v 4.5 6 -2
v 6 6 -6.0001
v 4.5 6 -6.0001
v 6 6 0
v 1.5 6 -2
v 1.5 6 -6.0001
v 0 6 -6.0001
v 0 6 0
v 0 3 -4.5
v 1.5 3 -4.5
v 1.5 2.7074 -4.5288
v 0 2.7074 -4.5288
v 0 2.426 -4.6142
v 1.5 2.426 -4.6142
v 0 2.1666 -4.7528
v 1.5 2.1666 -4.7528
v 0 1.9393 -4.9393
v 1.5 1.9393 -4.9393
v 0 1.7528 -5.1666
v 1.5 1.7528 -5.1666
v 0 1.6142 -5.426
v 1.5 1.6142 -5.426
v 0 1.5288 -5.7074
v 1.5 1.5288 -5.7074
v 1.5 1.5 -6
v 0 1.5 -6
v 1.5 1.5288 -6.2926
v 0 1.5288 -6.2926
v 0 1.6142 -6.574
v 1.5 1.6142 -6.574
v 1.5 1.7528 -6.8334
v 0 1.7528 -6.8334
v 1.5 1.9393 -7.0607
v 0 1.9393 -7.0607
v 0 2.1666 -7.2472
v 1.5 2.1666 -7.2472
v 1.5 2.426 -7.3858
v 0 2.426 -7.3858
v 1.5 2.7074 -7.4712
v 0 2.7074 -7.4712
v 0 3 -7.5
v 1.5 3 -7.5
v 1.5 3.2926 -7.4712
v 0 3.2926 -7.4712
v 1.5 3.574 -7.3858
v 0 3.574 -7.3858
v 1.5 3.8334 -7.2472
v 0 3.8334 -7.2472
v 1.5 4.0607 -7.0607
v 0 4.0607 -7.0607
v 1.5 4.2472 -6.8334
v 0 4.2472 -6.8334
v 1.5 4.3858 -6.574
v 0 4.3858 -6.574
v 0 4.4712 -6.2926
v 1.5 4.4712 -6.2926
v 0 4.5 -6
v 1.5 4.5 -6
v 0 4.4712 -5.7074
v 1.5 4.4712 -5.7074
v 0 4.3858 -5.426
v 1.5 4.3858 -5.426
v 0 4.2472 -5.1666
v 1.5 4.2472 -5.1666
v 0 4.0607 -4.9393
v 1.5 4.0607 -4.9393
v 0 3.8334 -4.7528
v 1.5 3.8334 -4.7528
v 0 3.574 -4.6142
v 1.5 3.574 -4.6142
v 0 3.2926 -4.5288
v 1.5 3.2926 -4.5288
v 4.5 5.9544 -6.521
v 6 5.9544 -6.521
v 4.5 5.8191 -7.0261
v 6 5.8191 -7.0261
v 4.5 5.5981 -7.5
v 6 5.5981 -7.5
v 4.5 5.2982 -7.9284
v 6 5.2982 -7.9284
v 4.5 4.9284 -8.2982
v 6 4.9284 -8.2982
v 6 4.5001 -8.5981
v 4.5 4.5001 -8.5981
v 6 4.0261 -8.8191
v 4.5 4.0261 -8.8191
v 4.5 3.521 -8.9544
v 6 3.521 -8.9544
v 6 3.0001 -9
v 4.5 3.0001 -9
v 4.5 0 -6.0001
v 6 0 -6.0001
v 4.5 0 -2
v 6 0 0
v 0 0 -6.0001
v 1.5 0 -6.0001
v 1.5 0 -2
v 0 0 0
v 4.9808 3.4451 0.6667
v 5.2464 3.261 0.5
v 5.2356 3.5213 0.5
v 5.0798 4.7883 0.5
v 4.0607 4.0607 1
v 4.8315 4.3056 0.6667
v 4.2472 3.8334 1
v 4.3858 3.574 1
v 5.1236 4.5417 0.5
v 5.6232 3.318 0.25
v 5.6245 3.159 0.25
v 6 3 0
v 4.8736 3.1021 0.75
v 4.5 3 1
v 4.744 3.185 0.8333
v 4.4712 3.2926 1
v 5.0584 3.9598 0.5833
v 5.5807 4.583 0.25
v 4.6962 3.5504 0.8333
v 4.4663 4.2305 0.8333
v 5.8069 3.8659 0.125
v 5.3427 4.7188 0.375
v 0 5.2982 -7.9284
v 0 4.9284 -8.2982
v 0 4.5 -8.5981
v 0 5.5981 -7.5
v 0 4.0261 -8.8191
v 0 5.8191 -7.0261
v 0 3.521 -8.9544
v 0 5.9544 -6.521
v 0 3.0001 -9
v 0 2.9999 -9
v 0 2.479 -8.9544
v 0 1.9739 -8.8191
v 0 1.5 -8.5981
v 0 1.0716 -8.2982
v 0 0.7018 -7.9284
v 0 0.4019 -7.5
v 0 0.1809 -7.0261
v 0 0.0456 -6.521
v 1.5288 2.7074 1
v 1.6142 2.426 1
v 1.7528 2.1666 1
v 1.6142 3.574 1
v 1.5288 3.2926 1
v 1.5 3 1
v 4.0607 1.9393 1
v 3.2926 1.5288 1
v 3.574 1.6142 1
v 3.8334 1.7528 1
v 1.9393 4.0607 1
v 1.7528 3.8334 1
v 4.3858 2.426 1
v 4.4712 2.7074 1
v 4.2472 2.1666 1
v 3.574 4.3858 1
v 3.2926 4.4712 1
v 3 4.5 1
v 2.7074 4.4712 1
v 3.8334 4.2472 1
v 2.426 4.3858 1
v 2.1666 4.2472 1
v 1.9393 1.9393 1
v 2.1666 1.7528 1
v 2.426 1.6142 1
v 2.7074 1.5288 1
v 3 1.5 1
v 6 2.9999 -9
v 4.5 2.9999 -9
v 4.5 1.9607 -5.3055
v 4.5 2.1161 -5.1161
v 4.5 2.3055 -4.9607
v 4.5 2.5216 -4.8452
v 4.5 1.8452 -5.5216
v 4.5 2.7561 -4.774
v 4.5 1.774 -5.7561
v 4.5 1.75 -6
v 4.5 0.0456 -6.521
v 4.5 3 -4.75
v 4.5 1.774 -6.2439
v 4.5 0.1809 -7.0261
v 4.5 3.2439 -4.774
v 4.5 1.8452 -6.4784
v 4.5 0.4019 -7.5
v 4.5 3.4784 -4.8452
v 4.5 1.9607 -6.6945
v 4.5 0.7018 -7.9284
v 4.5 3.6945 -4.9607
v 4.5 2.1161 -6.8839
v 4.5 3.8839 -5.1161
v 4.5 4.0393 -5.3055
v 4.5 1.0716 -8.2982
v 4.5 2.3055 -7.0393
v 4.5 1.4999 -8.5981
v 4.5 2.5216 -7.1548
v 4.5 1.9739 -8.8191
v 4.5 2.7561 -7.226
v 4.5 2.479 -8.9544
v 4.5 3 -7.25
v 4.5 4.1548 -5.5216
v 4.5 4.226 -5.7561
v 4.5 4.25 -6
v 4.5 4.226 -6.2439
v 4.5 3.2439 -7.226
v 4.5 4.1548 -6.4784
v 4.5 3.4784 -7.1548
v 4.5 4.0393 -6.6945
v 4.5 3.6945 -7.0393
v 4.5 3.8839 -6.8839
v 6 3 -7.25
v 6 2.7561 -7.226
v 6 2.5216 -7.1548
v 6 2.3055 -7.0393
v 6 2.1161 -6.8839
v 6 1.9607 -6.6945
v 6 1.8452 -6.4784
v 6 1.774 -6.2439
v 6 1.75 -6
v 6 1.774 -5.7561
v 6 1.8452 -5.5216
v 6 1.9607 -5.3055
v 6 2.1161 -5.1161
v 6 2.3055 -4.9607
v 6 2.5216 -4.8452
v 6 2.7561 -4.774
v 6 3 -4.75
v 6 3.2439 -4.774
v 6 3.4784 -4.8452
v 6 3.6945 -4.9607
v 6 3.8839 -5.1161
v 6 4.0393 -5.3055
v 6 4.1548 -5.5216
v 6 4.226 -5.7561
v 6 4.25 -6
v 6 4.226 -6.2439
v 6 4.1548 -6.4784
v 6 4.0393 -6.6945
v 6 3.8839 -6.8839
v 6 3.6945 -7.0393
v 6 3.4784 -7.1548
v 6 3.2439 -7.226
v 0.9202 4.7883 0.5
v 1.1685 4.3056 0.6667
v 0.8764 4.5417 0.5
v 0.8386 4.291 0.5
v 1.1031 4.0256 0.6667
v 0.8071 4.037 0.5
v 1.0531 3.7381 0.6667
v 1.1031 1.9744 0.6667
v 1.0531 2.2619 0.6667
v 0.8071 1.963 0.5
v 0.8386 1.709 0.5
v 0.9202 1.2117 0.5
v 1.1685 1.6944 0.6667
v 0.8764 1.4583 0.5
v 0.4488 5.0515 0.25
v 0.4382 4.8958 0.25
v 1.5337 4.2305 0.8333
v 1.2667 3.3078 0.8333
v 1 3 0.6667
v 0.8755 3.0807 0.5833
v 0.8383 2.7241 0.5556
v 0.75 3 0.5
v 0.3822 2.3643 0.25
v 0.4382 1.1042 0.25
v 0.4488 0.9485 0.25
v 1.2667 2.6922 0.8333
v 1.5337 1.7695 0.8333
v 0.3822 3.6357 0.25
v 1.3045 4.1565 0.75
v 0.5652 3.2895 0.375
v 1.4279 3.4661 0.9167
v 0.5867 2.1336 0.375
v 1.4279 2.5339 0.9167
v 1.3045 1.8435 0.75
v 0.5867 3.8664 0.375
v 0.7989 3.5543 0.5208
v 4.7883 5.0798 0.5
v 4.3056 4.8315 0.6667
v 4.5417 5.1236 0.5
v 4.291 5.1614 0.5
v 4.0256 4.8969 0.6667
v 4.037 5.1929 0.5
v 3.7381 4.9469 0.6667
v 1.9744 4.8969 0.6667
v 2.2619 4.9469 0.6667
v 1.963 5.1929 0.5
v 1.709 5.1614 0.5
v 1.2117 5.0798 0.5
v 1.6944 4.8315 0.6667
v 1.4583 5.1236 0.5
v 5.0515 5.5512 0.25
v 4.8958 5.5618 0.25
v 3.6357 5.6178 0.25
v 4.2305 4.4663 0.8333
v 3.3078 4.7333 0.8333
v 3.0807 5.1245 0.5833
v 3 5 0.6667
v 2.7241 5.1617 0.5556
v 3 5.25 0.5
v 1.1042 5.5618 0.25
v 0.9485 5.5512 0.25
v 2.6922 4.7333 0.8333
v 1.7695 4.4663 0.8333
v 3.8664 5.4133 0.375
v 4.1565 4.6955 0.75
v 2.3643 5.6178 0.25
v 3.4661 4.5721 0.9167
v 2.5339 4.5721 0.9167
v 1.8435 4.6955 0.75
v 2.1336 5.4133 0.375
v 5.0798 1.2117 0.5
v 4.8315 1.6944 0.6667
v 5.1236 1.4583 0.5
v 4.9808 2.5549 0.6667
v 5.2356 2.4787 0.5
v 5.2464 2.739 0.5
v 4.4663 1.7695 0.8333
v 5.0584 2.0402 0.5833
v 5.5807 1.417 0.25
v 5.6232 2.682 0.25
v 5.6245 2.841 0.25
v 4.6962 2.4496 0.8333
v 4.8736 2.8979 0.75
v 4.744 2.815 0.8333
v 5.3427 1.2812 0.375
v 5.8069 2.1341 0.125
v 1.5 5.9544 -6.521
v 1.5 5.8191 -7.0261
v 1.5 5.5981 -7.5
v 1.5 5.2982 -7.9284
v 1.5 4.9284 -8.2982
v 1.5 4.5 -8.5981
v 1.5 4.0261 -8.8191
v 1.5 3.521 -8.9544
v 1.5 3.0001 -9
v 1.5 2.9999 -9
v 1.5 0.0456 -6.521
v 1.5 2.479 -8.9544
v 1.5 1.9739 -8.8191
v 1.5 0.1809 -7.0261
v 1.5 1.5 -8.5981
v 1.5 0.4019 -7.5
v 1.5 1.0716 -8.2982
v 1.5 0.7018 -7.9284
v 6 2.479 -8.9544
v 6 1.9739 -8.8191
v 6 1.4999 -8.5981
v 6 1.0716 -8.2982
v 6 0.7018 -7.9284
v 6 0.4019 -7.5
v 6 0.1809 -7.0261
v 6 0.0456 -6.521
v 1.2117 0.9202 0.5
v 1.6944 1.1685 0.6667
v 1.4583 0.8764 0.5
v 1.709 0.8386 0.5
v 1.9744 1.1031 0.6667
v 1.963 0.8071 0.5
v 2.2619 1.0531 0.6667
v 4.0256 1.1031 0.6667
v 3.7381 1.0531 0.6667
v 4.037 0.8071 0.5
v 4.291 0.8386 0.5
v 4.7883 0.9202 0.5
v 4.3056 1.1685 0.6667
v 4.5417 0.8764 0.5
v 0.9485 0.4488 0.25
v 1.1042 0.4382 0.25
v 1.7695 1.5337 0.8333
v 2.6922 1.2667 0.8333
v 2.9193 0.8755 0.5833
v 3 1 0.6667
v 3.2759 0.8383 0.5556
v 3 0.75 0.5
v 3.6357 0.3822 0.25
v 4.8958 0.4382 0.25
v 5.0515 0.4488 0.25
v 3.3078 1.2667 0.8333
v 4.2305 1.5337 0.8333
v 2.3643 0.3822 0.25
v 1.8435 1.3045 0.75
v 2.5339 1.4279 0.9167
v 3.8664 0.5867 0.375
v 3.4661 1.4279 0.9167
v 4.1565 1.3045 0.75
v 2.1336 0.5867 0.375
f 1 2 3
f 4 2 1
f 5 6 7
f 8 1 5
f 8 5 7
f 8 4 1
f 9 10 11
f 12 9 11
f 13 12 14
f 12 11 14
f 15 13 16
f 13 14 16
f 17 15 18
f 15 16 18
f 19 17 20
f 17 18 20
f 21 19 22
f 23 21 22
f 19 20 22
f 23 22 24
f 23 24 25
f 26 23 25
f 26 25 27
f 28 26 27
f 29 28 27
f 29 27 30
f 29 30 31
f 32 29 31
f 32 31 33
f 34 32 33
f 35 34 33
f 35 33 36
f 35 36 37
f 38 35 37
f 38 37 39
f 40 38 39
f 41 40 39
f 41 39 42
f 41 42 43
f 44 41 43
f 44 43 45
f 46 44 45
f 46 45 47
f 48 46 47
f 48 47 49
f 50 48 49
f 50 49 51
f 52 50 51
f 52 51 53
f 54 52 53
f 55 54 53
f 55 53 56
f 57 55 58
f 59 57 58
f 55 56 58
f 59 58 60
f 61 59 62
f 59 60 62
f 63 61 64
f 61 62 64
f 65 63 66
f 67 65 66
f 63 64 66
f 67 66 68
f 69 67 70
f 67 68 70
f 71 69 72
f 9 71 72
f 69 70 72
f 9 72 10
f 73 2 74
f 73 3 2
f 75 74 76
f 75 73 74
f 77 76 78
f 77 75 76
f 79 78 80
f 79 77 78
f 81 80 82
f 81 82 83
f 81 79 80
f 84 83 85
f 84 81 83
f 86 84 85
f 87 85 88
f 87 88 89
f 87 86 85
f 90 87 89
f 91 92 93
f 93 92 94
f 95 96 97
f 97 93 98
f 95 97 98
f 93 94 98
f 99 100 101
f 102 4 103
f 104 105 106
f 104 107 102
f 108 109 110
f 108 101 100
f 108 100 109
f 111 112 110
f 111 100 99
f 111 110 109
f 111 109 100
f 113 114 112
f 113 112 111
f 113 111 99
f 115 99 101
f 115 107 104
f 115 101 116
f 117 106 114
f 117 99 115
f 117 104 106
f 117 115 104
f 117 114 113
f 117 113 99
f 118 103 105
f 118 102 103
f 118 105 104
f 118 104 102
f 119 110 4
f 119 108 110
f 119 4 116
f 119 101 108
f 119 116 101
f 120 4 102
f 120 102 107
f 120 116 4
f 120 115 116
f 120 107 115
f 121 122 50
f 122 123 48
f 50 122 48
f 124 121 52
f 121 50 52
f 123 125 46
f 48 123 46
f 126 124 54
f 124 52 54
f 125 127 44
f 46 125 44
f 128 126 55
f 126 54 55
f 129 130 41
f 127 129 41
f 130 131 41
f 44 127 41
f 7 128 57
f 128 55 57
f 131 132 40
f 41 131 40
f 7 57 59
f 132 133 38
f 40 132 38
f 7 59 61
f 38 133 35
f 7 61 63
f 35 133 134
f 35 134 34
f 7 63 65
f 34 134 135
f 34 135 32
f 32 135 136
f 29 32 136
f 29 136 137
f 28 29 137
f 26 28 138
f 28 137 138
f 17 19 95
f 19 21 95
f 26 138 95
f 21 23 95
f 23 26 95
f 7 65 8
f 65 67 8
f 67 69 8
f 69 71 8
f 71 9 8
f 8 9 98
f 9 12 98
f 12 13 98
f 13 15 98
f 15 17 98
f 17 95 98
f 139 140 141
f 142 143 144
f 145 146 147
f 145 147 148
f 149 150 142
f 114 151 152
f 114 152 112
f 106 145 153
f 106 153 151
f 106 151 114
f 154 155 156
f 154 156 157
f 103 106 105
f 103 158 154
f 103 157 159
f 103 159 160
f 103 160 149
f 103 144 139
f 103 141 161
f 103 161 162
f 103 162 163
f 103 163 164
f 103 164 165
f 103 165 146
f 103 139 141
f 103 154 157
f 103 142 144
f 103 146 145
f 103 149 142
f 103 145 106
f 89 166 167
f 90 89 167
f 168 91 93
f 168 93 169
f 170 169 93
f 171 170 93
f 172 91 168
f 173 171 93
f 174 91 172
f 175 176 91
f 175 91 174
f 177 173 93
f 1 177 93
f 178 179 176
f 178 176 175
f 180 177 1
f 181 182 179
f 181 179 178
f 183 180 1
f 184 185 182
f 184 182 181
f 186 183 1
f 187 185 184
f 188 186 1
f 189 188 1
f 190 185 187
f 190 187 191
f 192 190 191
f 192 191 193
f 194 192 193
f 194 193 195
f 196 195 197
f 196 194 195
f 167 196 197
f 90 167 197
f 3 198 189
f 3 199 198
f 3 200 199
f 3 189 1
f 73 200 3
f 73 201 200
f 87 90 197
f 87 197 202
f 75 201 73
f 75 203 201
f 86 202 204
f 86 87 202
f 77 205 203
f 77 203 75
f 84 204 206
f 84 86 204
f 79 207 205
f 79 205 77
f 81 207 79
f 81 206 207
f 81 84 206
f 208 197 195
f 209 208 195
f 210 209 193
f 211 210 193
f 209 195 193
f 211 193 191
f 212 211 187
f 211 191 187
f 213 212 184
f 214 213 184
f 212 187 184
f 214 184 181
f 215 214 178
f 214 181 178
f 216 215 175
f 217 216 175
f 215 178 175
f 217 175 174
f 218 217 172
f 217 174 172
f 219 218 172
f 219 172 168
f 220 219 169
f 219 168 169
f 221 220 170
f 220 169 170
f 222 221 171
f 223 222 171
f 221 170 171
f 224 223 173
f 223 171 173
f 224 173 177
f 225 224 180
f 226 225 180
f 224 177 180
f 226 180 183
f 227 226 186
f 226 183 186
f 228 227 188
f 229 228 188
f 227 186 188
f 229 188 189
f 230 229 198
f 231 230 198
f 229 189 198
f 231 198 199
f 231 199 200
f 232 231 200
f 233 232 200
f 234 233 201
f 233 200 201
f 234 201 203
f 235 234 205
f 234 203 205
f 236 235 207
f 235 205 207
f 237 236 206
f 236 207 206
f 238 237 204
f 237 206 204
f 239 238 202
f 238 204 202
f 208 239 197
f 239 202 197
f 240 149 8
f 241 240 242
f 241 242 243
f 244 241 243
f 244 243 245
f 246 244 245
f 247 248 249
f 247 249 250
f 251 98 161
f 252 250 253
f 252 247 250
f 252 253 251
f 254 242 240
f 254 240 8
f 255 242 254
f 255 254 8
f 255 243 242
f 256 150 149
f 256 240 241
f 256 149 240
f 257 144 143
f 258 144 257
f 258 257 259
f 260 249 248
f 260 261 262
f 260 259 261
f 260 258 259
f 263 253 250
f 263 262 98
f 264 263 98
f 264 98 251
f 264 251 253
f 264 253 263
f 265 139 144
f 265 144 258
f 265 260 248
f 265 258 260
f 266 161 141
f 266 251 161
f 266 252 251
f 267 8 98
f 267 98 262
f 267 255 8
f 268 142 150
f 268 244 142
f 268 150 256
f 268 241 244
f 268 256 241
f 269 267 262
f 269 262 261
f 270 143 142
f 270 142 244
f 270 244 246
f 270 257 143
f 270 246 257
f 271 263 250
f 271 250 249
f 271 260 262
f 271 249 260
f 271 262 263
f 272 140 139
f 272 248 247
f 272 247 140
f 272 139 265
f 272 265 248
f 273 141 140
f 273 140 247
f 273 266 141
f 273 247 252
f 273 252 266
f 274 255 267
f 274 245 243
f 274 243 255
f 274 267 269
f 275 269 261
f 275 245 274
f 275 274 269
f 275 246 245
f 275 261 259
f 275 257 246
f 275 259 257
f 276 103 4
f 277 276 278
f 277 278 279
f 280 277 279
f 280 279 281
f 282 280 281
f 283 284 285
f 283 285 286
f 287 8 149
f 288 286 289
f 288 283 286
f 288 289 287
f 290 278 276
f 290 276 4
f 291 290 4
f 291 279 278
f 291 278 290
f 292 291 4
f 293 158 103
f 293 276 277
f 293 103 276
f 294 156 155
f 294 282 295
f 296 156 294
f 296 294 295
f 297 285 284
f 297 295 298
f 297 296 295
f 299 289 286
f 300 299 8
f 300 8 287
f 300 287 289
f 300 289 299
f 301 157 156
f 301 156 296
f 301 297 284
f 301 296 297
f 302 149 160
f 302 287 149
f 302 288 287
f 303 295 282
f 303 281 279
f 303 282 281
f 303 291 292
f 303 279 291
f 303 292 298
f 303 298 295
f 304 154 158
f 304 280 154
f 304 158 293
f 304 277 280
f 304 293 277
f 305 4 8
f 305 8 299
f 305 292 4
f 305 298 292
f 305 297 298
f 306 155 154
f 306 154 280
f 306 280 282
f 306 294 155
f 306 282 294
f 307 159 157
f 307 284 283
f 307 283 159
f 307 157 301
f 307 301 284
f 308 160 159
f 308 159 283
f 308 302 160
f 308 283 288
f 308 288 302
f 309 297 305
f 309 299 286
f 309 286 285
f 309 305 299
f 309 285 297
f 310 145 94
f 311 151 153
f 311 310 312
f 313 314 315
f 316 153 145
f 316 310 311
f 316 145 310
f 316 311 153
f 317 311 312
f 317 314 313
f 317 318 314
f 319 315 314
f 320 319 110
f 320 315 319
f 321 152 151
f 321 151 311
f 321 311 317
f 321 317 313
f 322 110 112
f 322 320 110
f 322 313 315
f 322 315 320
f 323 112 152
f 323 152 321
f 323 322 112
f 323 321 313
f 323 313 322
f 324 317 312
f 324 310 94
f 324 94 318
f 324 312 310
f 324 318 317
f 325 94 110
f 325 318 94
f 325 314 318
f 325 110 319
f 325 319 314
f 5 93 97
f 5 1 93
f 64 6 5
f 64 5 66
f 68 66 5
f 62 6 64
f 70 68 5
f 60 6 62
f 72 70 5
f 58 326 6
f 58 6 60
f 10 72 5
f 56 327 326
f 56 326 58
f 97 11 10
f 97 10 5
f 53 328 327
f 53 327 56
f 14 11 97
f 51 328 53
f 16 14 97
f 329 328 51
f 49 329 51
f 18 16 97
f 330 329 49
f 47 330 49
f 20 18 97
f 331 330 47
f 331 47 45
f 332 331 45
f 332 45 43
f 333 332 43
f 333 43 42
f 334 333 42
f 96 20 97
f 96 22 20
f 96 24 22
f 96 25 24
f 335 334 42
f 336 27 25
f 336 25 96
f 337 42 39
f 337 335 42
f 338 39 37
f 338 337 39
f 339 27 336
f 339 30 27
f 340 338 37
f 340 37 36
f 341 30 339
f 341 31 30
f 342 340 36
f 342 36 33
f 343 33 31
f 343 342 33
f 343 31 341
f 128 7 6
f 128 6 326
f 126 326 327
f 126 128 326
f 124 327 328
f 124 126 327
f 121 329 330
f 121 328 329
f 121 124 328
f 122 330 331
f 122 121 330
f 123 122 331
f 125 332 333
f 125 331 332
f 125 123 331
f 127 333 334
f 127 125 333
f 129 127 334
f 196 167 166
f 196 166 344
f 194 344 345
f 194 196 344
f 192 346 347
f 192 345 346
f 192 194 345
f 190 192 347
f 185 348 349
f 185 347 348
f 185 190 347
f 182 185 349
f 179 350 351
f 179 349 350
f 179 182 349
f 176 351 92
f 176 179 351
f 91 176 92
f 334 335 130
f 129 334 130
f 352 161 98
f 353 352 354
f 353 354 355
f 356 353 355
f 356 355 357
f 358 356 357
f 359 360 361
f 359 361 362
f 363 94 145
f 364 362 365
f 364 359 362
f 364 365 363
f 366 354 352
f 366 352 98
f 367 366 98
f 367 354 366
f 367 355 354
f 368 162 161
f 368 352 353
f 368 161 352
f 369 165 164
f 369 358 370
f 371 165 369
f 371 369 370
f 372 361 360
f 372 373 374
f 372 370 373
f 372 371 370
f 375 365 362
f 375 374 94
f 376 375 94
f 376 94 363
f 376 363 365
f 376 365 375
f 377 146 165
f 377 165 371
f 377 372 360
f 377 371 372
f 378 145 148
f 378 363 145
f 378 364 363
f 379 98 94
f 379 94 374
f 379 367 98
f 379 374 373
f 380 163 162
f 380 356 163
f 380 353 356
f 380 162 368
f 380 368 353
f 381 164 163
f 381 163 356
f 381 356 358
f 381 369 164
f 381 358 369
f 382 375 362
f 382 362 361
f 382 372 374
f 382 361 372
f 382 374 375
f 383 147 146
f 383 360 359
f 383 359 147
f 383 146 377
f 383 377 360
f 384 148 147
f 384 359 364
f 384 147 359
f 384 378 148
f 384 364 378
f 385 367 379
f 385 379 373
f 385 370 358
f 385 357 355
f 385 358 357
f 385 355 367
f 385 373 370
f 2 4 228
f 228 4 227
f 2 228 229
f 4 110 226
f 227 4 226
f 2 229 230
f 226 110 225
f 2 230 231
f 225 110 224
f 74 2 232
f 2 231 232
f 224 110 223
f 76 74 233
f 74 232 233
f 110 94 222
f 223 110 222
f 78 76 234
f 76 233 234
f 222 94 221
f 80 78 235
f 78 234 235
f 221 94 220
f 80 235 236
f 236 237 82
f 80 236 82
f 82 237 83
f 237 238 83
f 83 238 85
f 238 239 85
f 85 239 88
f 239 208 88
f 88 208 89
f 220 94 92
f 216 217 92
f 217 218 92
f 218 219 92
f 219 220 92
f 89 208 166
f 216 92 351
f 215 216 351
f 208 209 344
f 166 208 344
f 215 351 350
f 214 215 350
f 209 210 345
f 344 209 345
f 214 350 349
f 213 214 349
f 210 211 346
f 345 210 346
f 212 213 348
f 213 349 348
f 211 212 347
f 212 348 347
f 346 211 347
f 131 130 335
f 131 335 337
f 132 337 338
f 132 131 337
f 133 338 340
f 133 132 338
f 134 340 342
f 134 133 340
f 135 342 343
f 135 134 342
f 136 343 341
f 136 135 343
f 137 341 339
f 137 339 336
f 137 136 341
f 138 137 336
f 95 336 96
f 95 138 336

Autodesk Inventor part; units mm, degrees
ref_plane "YZ Plane" through (0, 0, 0) normal (1, 0, 0) x (0, 1, 0)
ref_plane "XZ Plane" through (0, 0, 0) normal (0, 1, 0) x (-1, 0, 0)
sketch "Sketch1" plane through (0, 0, 0) normal (0, 1, 0) x (-1, 0, 0)
  line L0 (0, 0) -> (-6, 0)
  line L1 (-6, 0) -> (-6, -9)
  line L2 (-6, -9) -> (0, -9)
  line L3 (0, -9) -> (0, 0)
  dimension "d0" = 6
  dimension "d1" = 9
extrude "Extrusion1" add sketch "Sketch1" along normal blind 6
sketch "Sketch2" plane through (6, 0, -9) normal (0, 0, -1) x (-1, 0, 0)
  line L0 (0, 6) -> (6, 6) projected
  line L1 (0, 0) -> (6, 0) projected
  line L2 (1.5, 6) -> (4.5, 6)
  line L3 (4.5, 6) -> (4.5, 0)
  line L4 (4.5, 0) -> (1.5, 0)
  line L5 (1.5, 0) -> (1.5, 6)
  line L6 (0, 0) -> (0, 6) projected
  dimension "d4" = 3
  dimension "d5" = 1.5
sketch "Sketch3" plane through (0, 0, 0) normal (0, -1, 0) x (1, 0, 0)
  line L0 (6, 0) -> (6, -9) projected
  line L1 (0, 0) -> (6, 0) projected
  point P0 (3, 1)
  dimension "d6" = 3
  dimension "d7" = 1
ref_plane "Work Plane1" through (3, 0, 1) normal (0, 0, 1) x (1, 0, 0)
sketch "Sketch4" plane through (3, 0, 1) normal (0, 0, 1) x (1, 0, 0)
  point P0 (-3, 0)
sketch "Sketch5" plane through (3, 0, 1) normal (0, 0, 1) x (1, 0, 0)
  circle A0 centre (0, 3) radius 1.5
  point P0 (-3, 0)
  dimension "d8" = 3
loft "Loft1" add profiles "Sketch5" section 1 edges at (3, 0, 0) (6, 3, 0) (3, 6, 0) (0, 3, 0)
extrude "Extrusion2" cut sketch "Sketch2" against normal blind 7 contours L0 L3 L1 L5
sketch "Sketch6" plane through (6, 0, -9) normal (1, 0, 0) x (0, 0, -1)
  line L0 (-9, 0) -> (-9, 6) projected
  line L1 (-9, 6) -> (0, 6) projected
  point P0 (-3, 3)
  dimension "d15" = 6
  dimension "d16" = 3
hole "Hole1" at (6, 3, -6) direction (-1, 0, 0) diameter 2.5 depth 1.5 tip angle 118
sketch "Sketch7" plane through (0, 0, -9) normal (-1, 0, 0) x (0, 0, 1)
  circle A0 centre (3, 3) radius 1.25 projected
  point P0 (9, 0)
hole "Hole2" at (0, 3, -6) at (0, 3, -6) direction (1, 0, 0) diameter 3 depth 1.5 tip angle 118
thread "Thread1" size "M2.5x0.45" class "6H" standard "ANSI Metric M Profile" full length
fillet "Fillet1" radius 3 4 edges at (5.25, 6, -9) (5.25, 0, -9) (0.75, 0, -9) (0.75, 6, -9)
sketch "Sketch8" plane through (6, 0, -2) normal (0, 0, -1) x (-1, 0, 0)
  line L0 (4.5, 6) -> (4.5, 0) projected
  line L1 (1.5, 6) -> (4.5, 6) projected
  line L2 (1.5, 0) -> (1.5, 6) projected
  line L3 (4.5, 0) -> (1.5, 0) projected
  point P0 (6, 0)
  point P1 (3, 3)
properties material "Brass, Soft Yellow, Welded"
